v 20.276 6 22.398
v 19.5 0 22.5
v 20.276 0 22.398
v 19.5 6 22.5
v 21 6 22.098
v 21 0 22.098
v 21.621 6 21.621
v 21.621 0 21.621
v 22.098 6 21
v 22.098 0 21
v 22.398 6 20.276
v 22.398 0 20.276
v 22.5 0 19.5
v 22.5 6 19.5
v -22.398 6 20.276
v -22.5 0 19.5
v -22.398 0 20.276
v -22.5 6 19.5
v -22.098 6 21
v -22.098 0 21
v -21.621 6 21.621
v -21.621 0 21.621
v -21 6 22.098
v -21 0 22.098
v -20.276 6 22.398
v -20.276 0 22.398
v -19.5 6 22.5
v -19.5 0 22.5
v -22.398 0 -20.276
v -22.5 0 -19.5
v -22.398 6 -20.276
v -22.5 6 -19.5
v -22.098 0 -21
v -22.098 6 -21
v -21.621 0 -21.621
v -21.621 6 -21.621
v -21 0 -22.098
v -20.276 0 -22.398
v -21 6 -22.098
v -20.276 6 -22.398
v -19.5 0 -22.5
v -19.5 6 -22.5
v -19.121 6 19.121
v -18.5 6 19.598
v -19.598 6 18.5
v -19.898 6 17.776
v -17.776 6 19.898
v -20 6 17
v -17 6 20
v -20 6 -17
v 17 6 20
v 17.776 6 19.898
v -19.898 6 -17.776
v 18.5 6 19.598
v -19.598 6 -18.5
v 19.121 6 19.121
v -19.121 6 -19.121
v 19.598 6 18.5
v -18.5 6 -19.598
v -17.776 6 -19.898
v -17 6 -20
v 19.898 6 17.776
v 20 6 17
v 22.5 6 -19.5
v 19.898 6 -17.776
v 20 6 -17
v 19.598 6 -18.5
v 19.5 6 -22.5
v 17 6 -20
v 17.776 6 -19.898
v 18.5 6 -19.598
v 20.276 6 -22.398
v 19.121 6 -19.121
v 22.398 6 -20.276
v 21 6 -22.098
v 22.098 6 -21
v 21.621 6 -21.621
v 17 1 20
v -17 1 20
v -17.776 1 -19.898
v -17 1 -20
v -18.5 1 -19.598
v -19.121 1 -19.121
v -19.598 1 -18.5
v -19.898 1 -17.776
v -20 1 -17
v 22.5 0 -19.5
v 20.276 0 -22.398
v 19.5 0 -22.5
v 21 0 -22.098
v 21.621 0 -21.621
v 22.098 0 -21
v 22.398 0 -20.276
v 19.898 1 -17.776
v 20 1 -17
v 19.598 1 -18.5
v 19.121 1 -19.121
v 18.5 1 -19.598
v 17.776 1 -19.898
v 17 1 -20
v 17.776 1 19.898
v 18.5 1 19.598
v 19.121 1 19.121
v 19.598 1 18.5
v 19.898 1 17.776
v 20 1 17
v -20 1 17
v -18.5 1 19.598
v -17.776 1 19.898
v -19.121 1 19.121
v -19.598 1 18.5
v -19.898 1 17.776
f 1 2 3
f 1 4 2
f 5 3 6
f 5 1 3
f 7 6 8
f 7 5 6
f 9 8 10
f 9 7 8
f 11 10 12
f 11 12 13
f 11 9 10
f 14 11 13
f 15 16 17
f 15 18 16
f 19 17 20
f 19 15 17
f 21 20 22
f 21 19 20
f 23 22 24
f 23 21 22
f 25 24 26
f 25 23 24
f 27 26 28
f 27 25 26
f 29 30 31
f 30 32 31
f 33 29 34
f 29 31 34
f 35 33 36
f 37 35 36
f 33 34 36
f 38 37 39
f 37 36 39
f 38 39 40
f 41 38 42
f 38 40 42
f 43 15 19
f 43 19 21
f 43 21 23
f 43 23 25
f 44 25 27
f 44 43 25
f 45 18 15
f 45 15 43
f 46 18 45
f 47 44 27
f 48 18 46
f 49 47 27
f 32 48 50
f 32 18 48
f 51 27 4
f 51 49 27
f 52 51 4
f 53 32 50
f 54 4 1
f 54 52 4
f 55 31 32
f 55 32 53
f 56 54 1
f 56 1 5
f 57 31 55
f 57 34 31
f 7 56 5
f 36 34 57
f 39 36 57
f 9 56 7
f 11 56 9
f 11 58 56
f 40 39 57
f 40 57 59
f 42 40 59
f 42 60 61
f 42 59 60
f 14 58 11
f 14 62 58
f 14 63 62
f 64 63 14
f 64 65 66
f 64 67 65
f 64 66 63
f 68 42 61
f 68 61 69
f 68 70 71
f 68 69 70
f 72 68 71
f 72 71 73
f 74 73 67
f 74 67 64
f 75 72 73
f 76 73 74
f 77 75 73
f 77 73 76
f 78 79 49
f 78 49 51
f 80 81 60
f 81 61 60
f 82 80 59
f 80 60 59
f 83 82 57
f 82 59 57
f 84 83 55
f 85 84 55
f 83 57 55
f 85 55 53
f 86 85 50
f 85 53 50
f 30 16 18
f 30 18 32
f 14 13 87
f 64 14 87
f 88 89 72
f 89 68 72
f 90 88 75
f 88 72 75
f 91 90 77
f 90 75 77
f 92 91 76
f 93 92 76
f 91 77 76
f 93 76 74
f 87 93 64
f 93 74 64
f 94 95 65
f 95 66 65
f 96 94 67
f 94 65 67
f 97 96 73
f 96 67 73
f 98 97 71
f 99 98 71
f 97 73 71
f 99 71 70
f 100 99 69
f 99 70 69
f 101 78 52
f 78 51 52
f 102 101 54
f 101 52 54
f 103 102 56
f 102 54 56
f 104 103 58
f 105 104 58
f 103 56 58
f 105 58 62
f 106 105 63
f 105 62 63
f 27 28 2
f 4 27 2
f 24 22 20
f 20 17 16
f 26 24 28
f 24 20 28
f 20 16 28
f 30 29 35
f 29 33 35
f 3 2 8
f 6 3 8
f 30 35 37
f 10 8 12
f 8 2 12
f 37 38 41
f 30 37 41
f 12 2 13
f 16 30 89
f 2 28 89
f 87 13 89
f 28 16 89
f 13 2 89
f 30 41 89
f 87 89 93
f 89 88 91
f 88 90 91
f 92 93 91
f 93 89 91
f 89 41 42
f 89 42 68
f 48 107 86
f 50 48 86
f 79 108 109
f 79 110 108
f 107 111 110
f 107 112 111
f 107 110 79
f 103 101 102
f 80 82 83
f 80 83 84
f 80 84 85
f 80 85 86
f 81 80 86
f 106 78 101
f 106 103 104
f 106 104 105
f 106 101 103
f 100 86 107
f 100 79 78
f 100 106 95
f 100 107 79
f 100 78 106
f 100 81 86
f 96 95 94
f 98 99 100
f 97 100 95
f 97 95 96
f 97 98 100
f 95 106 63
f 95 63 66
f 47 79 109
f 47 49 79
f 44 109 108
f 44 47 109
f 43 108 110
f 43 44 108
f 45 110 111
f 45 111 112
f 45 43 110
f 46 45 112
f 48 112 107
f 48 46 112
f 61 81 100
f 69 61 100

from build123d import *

# Parameters (mm, degrees)
SKETCH1_W           = 40
SKETCH1_H           = 40
BOSS_EXTRUDE1_DEPTH = 1
SKETCH1_3_W         = 45
SKETCH1_3_H         = 45
SKETCH1_3_W_2       = 40
SKETCH1_3_H_2       = 40
BOSS_EXTRUDE2_DEPTH = 6
FILLET1_R           = 3


with BuildPart() as part:
    # Sketch1 → Boss-Extrude1 (new body)
    with BuildSketch(Plane(origin=(0, 0, 0), x_dir=(1, 0, 0), z_dir=(0, 1, 0))):
        Rectangle(SKETCH1_W, SKETCH1_H)
    extrude(amount=BOSS_EXTRUDE1_DEPTH)

    # Sketch1<3> → Boss-Extrude2 (add)
    with BuildSketch(Plane(origin=(0, 0, 0), x_dir=(1, 0, 0), z_dir=(0, 1, 0))):
        Rectangle(SKETCH1_3_W, SKETCH1_3_H)
        Rectangle(SKETCH1_3_W_2, SKETCH1_3_H_2, mode=Mode.SUBTRACT)
    extrude(amount=BOSS_EXTRUDE2_DEPTH)

    # Fillet1
    fillet1_edges = [part.edges().sort_by_distance(p)[0] for p in [
        (22.5, 3, 22.5),
        (22.5, 3, -22.5),
        (-22.5, 3, -22.5),
        (-22.5, 3, 22.5),
        (20, 3.5, -20),
        (-20, 3.5, -20),
        (-20, 3.5, 20),
        (20, 3.5, 20),
    ]]
    fillet(fillet1_edges, radius=FILLET1_R)


solid = part.part
